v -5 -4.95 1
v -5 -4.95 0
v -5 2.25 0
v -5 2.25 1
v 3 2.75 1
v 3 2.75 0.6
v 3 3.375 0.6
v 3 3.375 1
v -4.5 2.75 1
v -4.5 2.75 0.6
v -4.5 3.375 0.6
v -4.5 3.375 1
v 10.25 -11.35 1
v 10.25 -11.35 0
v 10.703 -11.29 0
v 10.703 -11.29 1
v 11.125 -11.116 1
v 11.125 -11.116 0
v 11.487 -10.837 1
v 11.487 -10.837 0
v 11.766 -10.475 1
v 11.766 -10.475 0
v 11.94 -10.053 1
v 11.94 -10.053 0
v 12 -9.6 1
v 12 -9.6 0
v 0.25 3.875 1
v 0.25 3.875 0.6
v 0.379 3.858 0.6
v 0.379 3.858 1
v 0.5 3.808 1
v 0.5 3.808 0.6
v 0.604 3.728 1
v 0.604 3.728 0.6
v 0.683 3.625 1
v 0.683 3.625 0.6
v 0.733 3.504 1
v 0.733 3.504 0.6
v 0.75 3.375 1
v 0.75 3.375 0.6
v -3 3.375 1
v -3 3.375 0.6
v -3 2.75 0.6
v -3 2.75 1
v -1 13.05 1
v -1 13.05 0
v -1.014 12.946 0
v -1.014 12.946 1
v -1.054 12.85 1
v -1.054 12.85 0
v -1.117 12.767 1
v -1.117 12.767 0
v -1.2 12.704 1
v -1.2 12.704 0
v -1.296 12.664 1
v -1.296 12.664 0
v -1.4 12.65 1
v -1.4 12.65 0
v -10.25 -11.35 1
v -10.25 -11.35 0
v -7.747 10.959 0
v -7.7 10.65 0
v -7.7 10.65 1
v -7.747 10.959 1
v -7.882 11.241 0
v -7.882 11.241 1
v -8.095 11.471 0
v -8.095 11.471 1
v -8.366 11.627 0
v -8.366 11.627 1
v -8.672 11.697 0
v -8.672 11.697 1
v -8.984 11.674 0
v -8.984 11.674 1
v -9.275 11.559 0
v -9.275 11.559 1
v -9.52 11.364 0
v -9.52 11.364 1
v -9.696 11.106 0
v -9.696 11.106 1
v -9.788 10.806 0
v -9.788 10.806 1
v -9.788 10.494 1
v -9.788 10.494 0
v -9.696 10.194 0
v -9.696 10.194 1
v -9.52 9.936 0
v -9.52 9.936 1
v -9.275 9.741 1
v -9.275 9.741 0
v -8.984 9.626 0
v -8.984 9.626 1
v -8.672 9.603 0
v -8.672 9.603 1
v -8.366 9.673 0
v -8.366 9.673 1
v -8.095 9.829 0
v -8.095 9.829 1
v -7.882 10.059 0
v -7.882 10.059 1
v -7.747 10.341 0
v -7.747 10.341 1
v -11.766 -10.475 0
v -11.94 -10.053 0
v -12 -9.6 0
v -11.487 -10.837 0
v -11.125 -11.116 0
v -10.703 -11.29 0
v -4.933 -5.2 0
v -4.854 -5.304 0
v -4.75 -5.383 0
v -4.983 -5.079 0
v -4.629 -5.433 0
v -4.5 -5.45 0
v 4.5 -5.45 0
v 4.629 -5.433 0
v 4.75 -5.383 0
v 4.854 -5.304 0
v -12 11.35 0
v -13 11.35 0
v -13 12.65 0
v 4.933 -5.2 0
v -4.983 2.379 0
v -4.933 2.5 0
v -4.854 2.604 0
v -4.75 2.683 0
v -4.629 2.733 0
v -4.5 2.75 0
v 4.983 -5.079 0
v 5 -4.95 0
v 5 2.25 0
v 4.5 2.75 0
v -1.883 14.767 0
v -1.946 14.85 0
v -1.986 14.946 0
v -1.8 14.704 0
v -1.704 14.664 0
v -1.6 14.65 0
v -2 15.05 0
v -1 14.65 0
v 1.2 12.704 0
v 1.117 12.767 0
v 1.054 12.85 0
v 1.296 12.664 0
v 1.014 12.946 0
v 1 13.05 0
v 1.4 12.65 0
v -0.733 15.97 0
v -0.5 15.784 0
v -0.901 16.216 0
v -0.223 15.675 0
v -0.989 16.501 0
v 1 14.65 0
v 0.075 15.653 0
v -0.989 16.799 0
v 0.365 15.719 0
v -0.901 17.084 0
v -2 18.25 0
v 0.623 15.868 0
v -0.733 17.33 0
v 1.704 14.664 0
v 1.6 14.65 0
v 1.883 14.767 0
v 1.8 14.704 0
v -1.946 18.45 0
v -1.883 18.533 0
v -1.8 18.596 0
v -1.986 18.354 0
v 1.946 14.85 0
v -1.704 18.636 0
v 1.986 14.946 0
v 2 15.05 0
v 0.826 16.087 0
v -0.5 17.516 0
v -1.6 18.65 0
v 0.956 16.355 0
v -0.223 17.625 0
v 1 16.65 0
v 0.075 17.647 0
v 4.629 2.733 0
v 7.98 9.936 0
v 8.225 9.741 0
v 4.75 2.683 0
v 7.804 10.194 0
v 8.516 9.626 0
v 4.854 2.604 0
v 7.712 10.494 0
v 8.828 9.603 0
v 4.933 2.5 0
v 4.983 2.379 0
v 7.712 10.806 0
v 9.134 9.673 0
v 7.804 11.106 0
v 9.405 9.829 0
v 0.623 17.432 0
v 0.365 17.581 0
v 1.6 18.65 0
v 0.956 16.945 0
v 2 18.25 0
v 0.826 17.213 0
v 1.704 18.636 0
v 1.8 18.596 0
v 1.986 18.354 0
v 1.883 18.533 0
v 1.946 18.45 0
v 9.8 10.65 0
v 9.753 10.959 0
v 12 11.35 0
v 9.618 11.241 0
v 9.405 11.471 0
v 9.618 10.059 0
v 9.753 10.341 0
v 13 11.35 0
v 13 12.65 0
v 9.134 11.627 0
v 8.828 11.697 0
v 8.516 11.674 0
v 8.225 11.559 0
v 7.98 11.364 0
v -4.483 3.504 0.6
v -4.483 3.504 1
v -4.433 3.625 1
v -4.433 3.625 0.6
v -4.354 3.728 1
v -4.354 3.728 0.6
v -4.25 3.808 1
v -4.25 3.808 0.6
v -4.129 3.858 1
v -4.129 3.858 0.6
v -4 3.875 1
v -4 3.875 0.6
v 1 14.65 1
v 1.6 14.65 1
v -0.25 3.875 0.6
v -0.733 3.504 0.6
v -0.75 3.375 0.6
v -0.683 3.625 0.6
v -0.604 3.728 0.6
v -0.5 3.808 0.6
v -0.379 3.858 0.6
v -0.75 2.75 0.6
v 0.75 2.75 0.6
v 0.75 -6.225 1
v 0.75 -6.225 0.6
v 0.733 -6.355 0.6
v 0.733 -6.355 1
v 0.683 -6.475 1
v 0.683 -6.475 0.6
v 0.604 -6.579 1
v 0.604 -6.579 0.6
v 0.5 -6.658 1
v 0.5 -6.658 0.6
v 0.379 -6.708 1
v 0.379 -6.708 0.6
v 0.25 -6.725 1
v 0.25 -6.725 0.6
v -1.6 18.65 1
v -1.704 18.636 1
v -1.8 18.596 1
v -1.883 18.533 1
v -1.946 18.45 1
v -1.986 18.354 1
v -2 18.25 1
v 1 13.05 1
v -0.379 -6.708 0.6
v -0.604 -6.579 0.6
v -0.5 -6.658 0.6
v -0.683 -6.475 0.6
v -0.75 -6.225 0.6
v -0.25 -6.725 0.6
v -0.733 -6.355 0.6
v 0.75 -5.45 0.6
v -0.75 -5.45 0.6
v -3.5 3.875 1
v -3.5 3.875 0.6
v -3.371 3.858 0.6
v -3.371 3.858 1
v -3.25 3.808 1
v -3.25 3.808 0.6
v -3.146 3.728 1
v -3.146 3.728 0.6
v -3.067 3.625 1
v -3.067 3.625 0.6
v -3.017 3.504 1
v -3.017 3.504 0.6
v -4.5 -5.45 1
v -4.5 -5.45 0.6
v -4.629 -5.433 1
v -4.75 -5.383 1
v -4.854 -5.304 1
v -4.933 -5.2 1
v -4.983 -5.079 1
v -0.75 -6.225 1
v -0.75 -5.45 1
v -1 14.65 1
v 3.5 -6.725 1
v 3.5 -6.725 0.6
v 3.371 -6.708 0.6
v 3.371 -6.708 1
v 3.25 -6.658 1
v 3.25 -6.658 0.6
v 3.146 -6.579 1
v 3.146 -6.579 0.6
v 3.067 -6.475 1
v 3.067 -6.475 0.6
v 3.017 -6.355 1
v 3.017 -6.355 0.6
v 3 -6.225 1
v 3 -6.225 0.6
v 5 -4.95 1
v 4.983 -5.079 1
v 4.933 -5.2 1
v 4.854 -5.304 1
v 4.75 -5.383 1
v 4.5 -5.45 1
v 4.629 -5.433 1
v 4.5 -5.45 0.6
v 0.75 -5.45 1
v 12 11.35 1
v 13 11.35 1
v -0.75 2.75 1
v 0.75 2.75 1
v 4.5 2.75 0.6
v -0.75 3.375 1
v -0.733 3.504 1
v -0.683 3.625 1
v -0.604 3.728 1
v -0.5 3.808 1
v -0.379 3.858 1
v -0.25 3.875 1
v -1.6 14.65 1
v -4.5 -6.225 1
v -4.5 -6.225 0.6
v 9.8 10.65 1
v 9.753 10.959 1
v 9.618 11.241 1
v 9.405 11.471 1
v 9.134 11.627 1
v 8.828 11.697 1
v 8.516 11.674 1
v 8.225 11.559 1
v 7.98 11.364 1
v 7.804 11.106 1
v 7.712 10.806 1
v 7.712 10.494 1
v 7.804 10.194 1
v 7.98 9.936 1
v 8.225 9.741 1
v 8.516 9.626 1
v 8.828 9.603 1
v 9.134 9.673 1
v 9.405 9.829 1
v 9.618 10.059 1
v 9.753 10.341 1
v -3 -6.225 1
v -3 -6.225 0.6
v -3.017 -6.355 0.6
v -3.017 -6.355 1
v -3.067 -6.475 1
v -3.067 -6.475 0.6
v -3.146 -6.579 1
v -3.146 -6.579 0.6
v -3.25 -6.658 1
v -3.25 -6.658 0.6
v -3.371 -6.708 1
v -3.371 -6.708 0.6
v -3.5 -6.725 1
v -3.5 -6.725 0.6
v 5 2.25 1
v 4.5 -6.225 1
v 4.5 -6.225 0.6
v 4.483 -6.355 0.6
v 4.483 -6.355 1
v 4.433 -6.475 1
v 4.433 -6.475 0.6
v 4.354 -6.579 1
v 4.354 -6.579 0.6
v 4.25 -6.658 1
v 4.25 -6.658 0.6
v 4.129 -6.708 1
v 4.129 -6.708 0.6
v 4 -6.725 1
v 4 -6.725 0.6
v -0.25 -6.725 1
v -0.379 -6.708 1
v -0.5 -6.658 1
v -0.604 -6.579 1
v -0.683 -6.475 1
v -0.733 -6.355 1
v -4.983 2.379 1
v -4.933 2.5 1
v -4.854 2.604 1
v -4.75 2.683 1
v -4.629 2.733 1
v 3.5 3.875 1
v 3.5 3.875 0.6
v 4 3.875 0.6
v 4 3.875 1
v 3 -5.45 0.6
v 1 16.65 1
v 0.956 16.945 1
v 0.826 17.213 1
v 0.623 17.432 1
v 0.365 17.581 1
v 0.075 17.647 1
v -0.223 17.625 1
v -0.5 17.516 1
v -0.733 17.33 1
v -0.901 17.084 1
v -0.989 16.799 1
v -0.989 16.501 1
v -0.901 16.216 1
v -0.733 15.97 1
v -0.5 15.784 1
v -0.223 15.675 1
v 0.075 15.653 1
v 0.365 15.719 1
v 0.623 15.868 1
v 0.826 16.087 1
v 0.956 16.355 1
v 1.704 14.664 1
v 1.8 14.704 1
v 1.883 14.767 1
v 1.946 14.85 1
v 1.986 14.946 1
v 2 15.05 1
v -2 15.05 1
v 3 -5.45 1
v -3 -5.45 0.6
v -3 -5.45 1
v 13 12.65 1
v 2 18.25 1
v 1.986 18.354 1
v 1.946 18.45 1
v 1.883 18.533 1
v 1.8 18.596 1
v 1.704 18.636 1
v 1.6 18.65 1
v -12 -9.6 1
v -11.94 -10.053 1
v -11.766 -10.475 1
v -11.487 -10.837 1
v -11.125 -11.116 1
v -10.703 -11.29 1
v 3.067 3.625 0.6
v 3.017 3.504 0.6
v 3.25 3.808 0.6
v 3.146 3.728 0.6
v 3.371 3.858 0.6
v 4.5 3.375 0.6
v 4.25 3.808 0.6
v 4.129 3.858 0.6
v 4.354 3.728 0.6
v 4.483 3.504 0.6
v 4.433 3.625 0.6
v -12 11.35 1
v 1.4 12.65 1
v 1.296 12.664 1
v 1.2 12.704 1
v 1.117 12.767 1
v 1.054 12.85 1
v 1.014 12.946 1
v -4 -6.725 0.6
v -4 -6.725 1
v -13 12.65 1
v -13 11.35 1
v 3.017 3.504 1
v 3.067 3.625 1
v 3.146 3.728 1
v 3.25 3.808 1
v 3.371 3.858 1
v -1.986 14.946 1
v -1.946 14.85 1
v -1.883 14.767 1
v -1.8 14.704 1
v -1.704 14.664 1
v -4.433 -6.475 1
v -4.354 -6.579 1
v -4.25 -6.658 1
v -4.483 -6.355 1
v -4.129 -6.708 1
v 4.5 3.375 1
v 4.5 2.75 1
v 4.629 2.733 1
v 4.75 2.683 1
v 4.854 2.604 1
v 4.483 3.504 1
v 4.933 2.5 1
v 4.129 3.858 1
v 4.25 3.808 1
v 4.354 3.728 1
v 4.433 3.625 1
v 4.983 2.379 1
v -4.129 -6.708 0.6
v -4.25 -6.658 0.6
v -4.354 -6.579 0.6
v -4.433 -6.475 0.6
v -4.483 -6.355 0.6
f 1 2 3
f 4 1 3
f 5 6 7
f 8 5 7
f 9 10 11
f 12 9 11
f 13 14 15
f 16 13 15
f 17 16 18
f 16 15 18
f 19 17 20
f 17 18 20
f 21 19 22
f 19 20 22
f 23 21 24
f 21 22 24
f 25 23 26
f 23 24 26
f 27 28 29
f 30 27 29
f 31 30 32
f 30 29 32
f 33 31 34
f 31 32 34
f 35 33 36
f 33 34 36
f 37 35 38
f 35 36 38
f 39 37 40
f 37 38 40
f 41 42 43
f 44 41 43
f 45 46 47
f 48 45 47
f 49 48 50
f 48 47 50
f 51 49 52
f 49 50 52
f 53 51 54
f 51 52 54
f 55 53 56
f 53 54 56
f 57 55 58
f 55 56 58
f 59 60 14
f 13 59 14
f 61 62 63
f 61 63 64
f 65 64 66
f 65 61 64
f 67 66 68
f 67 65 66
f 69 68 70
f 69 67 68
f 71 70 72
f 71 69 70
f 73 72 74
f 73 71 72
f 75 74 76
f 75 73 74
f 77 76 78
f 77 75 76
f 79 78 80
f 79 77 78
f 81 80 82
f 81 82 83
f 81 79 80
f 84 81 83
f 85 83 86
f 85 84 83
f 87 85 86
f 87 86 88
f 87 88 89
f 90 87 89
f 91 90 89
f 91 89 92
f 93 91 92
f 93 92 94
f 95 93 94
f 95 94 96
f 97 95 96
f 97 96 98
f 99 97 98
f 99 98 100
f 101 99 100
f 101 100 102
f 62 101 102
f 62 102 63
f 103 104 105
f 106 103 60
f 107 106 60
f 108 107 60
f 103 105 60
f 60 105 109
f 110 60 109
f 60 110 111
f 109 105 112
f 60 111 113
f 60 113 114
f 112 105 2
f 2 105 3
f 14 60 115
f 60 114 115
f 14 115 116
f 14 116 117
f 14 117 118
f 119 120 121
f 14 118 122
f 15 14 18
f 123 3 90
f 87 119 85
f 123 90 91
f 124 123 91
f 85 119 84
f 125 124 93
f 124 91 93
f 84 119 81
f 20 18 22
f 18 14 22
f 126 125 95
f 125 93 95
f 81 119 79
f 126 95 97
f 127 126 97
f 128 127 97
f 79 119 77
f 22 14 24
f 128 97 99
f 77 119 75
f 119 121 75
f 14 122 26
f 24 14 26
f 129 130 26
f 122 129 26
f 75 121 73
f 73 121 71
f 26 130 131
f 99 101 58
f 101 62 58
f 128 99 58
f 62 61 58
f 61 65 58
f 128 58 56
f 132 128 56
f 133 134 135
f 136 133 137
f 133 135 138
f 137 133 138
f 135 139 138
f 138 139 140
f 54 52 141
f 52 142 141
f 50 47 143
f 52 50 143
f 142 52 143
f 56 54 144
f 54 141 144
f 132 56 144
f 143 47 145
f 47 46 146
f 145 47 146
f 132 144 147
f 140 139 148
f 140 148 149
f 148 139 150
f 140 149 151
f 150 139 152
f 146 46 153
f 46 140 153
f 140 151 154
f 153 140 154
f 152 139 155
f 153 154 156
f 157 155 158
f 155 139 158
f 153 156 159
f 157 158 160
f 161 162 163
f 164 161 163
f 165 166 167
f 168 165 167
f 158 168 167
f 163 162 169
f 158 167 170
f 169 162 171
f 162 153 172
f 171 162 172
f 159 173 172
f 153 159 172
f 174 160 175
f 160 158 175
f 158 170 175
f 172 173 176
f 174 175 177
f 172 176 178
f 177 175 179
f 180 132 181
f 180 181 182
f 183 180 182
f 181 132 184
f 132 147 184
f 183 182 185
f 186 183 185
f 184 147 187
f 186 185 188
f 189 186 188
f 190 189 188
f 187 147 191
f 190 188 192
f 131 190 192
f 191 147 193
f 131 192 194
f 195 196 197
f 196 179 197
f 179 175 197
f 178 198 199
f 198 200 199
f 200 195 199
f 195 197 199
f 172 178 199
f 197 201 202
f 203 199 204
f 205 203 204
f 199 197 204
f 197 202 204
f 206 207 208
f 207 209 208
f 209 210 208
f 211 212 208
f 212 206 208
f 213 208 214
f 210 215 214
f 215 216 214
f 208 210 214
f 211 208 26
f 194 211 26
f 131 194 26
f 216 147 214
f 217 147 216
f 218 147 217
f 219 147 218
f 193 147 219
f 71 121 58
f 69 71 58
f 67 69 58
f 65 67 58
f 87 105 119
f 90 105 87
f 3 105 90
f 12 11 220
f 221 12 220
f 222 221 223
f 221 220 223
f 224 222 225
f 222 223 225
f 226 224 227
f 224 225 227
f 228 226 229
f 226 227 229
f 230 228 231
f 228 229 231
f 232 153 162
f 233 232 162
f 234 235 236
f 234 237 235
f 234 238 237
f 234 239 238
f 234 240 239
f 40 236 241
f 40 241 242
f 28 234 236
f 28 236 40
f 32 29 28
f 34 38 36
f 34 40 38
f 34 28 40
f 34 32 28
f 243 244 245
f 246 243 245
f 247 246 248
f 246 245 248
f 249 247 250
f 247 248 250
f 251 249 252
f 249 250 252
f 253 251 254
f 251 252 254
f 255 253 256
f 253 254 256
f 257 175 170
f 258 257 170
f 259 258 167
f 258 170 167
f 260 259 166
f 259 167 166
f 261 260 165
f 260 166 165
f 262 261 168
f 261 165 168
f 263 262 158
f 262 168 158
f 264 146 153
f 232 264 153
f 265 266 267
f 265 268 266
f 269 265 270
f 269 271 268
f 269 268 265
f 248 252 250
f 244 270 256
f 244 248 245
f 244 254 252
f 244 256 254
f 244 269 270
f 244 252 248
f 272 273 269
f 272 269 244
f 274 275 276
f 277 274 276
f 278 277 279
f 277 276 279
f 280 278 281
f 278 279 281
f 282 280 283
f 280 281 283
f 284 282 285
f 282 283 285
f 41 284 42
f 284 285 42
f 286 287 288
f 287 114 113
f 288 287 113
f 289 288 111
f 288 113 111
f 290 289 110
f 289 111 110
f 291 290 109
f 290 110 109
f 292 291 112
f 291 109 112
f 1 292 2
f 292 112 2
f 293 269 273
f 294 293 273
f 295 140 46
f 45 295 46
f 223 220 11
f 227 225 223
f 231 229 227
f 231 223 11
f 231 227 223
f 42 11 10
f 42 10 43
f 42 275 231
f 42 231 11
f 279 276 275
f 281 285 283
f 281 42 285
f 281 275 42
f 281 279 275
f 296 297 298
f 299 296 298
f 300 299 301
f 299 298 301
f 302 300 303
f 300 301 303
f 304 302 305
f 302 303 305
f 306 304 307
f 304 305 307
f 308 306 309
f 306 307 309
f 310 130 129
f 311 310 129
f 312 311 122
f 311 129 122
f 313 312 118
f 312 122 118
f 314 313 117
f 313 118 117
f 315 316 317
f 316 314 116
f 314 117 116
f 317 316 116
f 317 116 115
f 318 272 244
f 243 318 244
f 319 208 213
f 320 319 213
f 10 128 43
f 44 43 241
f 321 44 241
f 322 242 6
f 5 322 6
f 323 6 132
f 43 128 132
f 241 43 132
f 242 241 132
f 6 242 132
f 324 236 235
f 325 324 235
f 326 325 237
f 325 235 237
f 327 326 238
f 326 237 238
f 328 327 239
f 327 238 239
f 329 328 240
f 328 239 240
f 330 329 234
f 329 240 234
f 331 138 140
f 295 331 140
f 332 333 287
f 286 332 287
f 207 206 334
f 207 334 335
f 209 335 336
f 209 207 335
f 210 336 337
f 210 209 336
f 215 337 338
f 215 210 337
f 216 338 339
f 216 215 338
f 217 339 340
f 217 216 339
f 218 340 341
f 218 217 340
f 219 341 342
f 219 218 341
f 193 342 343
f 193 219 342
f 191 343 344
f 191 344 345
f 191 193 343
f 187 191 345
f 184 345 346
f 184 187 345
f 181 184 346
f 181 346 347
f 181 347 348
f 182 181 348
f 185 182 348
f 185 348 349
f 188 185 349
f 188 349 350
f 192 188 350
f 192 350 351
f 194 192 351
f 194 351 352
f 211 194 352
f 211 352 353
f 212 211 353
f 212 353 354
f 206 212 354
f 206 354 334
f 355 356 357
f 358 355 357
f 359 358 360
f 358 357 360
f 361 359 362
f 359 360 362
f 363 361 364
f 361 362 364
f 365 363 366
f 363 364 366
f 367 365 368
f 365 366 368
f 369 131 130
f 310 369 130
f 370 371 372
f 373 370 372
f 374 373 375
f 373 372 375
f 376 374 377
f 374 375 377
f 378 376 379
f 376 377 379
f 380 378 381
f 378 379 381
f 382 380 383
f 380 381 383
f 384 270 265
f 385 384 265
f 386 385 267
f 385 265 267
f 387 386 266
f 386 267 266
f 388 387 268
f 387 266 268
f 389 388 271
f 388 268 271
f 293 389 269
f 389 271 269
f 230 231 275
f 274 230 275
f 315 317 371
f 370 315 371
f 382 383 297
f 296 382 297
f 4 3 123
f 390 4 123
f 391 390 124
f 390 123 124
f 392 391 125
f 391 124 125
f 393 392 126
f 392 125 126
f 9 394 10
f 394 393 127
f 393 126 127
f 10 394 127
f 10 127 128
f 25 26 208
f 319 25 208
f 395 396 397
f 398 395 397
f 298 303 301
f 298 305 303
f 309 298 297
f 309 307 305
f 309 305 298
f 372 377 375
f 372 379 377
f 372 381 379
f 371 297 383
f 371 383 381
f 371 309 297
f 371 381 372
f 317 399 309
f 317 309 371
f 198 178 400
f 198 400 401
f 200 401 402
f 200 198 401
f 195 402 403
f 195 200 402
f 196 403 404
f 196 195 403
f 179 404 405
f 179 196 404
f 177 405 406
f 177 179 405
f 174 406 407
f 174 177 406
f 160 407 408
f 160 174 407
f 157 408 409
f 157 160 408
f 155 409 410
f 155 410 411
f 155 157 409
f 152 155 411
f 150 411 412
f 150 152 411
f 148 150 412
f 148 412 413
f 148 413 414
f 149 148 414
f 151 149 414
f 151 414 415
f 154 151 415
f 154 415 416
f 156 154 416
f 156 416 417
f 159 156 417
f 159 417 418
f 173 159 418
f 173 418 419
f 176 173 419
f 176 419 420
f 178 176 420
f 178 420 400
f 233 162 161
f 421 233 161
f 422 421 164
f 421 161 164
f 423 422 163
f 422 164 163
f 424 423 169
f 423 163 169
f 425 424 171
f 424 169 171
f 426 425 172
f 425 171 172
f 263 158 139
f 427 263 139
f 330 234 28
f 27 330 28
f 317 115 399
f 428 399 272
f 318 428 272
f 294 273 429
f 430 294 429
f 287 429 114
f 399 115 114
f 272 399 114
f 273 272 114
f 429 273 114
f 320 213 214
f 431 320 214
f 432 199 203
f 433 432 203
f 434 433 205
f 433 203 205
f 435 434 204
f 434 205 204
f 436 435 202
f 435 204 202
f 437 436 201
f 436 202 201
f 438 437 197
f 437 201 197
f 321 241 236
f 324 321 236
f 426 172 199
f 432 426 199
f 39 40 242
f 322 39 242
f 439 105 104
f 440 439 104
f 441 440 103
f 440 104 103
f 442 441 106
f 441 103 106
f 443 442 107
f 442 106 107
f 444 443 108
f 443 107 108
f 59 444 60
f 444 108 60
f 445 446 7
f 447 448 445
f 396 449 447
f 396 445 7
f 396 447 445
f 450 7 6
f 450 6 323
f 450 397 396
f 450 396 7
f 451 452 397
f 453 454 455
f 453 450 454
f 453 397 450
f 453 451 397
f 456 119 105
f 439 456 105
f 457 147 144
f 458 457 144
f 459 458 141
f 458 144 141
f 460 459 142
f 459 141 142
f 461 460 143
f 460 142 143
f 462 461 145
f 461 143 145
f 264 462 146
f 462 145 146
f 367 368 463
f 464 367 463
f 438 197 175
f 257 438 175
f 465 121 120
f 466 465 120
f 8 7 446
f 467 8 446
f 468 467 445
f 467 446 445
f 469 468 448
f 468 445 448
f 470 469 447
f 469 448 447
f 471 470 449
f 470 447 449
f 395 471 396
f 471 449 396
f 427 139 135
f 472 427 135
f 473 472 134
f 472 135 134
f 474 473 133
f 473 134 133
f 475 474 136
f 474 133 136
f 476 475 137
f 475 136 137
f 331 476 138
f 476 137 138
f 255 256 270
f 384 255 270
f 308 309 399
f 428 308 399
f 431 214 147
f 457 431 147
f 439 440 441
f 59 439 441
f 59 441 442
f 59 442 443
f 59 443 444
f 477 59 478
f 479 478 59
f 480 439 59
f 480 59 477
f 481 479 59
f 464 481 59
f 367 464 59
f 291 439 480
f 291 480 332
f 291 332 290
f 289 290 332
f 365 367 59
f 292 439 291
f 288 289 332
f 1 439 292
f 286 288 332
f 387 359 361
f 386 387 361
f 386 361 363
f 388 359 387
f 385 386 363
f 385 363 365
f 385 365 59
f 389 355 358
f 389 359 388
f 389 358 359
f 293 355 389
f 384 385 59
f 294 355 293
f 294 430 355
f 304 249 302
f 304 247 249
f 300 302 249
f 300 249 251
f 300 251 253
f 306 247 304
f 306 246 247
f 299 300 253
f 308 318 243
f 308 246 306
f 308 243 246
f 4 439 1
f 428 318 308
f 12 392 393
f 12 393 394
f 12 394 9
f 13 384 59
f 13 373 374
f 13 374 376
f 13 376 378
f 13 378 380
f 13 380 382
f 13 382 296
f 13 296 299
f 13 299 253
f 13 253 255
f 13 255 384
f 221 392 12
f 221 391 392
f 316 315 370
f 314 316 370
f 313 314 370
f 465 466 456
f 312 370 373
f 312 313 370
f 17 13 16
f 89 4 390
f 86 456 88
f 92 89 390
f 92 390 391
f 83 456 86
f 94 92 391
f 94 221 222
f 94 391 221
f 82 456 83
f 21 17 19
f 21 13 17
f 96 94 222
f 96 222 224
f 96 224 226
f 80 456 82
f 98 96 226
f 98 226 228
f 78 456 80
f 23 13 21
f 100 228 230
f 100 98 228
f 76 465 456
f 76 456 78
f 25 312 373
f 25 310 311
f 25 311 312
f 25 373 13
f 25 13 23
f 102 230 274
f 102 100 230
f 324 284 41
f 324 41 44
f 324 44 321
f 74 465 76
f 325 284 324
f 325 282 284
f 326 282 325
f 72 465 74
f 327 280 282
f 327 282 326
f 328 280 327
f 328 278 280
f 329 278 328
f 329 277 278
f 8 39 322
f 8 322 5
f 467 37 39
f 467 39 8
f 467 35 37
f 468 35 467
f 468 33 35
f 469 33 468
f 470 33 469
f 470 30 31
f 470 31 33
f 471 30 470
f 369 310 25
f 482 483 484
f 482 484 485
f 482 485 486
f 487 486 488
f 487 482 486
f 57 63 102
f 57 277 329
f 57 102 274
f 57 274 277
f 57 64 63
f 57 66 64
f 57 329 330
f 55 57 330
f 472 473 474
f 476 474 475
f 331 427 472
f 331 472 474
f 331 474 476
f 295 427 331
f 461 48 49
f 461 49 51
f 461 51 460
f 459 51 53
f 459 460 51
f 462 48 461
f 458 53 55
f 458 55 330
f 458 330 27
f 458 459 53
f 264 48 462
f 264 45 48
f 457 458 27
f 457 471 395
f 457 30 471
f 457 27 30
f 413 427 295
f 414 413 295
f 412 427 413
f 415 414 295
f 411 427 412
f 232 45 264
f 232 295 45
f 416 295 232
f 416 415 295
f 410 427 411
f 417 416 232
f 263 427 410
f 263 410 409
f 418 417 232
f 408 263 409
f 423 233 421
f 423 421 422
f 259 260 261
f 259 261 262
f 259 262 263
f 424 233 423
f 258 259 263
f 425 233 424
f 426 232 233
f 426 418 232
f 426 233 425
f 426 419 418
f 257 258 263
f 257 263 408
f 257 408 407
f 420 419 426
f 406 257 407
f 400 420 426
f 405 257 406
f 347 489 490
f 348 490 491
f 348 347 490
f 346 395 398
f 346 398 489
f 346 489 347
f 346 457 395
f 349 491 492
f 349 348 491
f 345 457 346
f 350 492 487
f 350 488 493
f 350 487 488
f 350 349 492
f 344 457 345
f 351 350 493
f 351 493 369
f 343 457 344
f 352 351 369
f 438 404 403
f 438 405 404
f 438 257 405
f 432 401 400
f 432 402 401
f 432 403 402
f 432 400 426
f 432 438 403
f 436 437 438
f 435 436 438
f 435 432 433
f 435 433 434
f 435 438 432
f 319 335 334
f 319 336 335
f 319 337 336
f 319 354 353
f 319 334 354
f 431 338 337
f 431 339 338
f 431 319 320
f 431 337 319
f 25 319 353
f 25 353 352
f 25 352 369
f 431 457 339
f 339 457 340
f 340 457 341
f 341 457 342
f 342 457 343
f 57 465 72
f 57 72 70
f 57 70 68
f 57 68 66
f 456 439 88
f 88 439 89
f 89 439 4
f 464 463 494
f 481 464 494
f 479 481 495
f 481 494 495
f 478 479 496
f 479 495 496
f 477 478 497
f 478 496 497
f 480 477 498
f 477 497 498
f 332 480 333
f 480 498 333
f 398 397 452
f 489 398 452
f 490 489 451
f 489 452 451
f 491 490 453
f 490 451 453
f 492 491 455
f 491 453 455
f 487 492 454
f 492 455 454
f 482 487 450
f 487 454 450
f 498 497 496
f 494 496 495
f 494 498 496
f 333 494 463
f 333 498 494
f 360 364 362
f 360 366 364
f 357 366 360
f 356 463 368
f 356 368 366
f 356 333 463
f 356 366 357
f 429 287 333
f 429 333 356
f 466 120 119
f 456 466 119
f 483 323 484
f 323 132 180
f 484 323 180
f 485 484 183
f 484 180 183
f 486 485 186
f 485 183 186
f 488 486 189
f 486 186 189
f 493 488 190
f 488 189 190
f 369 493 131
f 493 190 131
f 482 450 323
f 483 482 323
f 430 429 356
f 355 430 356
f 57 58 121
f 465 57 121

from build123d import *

# Parameters (mm, degrees)
F0_R     = 1.05
F0_R_2   = 1
F1_DEPTH = 0.6
F2_DEPTH = 1


with BuildPart() as f1:
    # F0 (on Top) → F1 (new body)
    with BuildSketch(Plane.XY):
        with BuildLine():
            Line((-10.25, -11.35), (10.25, -11.35))
            ThreePointArc((10.25, -11.35), (11.487437, -10.837437), (12, -9.6))
            Line((12, -9.6), (12, 11.35))
            Line((12, 11.35), (13, 11.35))
            Line((13, 11.35), (13, 12.65))
            Line((13, 12.65), (1.4, 12.65))
            ThreePointArc((1.4, 12.65), (1.117157, 12.767157), (1, 13.05))
            Line((1, 13.05), (1, 14.65))
            Line((1, 14.65), (1.6, 14.65))
            ThreePointArc((1.6, 14.65), (1.882843, 14.767157), (2, 15.05))
            Line((2, 15.05), (2, 18.25))
            ThreePointArc((2, 18.25), (1.882843, 18.532843), (1.6, 18.65))
            Line((1.6, 18.65), (-1.6, 18.65))
            ThreePointArc((-1.6, 18.65), (-1.882843, 18.532843), (-2, 18.25))
            Line((-2, 18.25), (-2, 15.05))
            ThreePointArc((-2, 15.05), (-1.882843, 14.767157), (-1.6, 14.65))
            Line((-1.6, 14.65), (-1, 14.65))
            Line((-1, 14.65), (-1, 13.05))
            ThreePointArc((-1, 13.05), (-1.117157, 12.767157), (-1.4, 12.65))
            Line((-1.4, 12.65), (-13, 12.65))
            Line((-13, 12.65), (-13, 11.35))
            Line((-13, 11.35), (-12, 11.35))
            Line((-12, 11.35), (-12, -9.6))
            ThreePointArc((-12, -9.6), (-11.487437, -10.837437), (-10.25, -11.35))
        make_face()
        with BuildLine():
            ThreePointArc((-5, 2.25), (-4.853553, 2.603553), (-4.5, 2.75))
            Line((-4.5, 2.75), (-4.5, 3.374709))
            ThreePointArc((-4.5, 3.374709), (-4.353553, 3.728262), (-4, 3.874709))
            Line((-4, 3.874709), (-3.5, 3.874709))
            ThreePointArc((-3.5, 3.874709), (-3.146447, 3.728262), (-3, 3.374709))
            Line((-3, 3.374709), (-3, 2.75))
            Line((-3, 2.75), (-0.75, 2.75))
            Line((-0.75, 2.75), (-0.75, 3.374709))
            ThreePointArc((-0.75, 3.374709), (-0.603553, 3.728262), (-0.25, 3.874709))
            Line((-0.25, 3.874709), (0.25, 3.874709))
            ThreePointArc((0.25, 3.874709), (0.603553, 3.728262), (0.75, 3.374709))
            Line((0.75, 3.374709), (0.75, 2.75))
            Line((0.75, 2.75), (3, 2.75))
            Line((3, 2.75), (3, 3.374709))
            ThreePointArc((3, 3.374709), (3.146447, 3.728262), (3.5, 3.874709))
            Line((3.5, 3.874709), (4, 3.874709))
            ThreePointArc((4, 3.874709), (4.353553, 3.728262), (4.5, 3.374709))
            Line((4.5, 3.374709), (4.5, 2.75))
            ThreePointArc((4.5, 2.75), (4.853553, 2.603553), (5, 2.25))
            Line((5, 2.25), (5, -4.95))
            ThreePointArc((5, -4.95), (4.853553, -5.303553), (4.5, -5.45))
            Line((4.5, -5.45), (4.5, -6.225291))
            ThreePointArc((4.5, -6.225291), (4.353553, -6.578845), (4, -6.725291))
            Line((4, -6.725291), (3.5, -6.725291))
            ThreePointArc((3.5, -6.725291), (3.146447, -6.578845), (3, -6.225291))
            Line((3, -6.225291), (3, -5.45))
            Line((3, -5.45), (0.75, -5.45))
            Line((0.75, -5.45), (0.75, -6.225291))
            ThreePointArc((0.75, -6.225291), (0.603553, -6.578845), (0.25, -6.725291))
            Line((0.25, -6.725291), (-0.25, -6.725291))
            ThreePointArc((-0.25, -6.725291), (-0.603553, -6.578845), (-0.75, -6.225291))
            Line((-0.75, -6.225291), (-0.75, -5.45))
            Line((-0.75, -5.45), (-3, -5.45))
            Line((-3, -5.45), (-3, -6.225291))
            ThreePointArc((-3, -6.225291), (-3.146447, -6.578845), (-3.5, -6.725291))
            Line((-3.5, -6.725291), (-4, -6.725291))
            ThreePointArc((-4, -6.725291), (-4.353553, -6.578845), (-4.5, -6.225291))
            Line((-4.5, -6.225291), (-4.5, -5.45))
            ThreePointArc((-4.5, -5.45), (-4.853553, -5.303553), (-5, -4.95))
            Line((-5, -4.95), (-5, 2.25))
        make_face(mode=Mode.SUBTRACT)
        with Locations((-8.75, 10.65)):
            Circle(F0_R, mode=Mode.SUBTRACT)
        with Locations((8.75, 10.65)):
            Circle(F0_R, mode=Mode.SUBTRACT)
        with Locations((0, 16.65)):
            Circle(F0_R_2, mode=Mode.SUBTRACT)
        with BuildLine():
            Line((-4.5, 3.374709), (-4.5, 2.75))
            Line((-4.5, 2.75), (-3, 2.75))
            Line((-3, 2.75), (-3, 3.374709))
            ThreePointArc((-3, 3.374709), (-3.146447, 3.728262), (-3.5, 3.874709))
            Line((-3.5, 3.874709), (-4, 3.874709))
            ThreePointArc((-4, 3.874709), (-4.353553, 3.728262), (-4.5, 3.374709))
        make_face()
        with BuildLine():
            Line((-0.75, 3.374709), (-0.75, 2.75))
            Line((-0.75, 2.75), (0.75, 2.75))
            Line((0.75, 2.75), (0.75, 3.374709))
            ThreePointArc((0.75, 3.374709), (0.603553, 3.728262), (0.25, 3.874709))
            Line((0.25, 3.874709), (-0.25, 3.874709))
            ThreePointArc((-0.25, 3.874709), (-0.603553, 3.728262), (-0.75, 3.374709))
        make_face()
        with BuildLine():
            Line((3, 3.374709), (3, 2.75))
            Line((3, 2.75), (4.5, 2.75))
            Line((4.5, 2.75), (4.5, 3.374709))
            ThreePointArc((4.5, 3.374709), (4.353553, 3.728262), (4, 3.874709))
            Line((4, 3.874709), (3.5, 3.874709))
            ThreePointArc((3.5, 3.874709), (3.146447, 3.728262), (3, 3.374709))
        make_face()
        with BuildLine():
            Line((4.5, -5.45), (3, -5.45))
            Line((3, -5.45), (3, -6.225291))
            ThreePointArc((3, -6.225291), (3.146447, -6.578845), (3.5, -6.725291))
            Line((3.5, -6.725291), (4, -6.725291))
            ThreePointArc((4, -6.725291), (4.353553, -6.578845), (4.5, -6.225291))
            Line((4.5, -6.225291), (4.5, -5.45))
        make_face()
        with BuildLine():
            Line((0.75, -5.45), (-0.75, -5.45))
            Line((-0.75, -5.45), (-0.75, -6.225291))
            ThreePointArc((-0.75, -6.225291), (-0.603553, -6.578845), (-0.25, -6.725291))
            Line((-0.25, -6.725291), (0.25, -6.725291))
            ThreePointArc((0.25, -6.725291), (0.603553, -6.578845), (0.75, -6.225291))
            Line((0.75, -6.225291), (0.75, -5.45))
        make_face()
        with BuildLine():
            Line((-3, -5.45), (-4.5, -5.45))
            Line((-4.5, -5.45), (-4.5, -6.225291))
            ThreePointArc((-4.5, -6.225291), (-4.353553, -6.578845), (-4, -6.725291))
            Line((-4, -6.725291), (-3.5, -6.725291))
            ThreePointArc((-3.5, -6.725291), (-3.146447, -6.578845), (-3, -6.225291))
            Line((-3, -6.225291), (-3, -5.45))
        make_face()
    extrude(amount=F1_DEPTH)

    # F0 (on Top) → F2 (join)
    with BuildSketch(Plane.XY):
        with BuildLine():
            Line((-10.25, -11.35), (10.25, -11.35))
            ThreePointArc((10.25, -11.35), (11.487437, -10.837437), (12, -9.6))
            Line((12, -9.6), (12, 11.35))
            Line((12, 11.35), (13, 11.35))
            Line((13, 11.35), (13, 12.65))
            Line((13, 12.65), (1.4, 12.65))
            ThreePointArc((1.4, 12.65), (1.117157, 12.767157), (1, 13.05))
            Line((1, 13.05), (1, 14.65))
            Line((1, 14.65), (1.6, 14.65))
            ThreePointArc((1.6, 14.65), (1.882843, 14.767157), (2, 15.05))
            Line((2, 15.05), (2, 18.25))
            ThreePointArc((2, 18.25), (1.882843, 18.532843), (1.6, 18.65))
            Line((1.6, 18.65), (-1.6, 18.65))
            ThreePointArc((-1.6, 18.65), (-1.882843, 18.532843), (-2, 18.25))
            Line((-2, 18.25), (-2, 15.05))
            ThreePointArc((-2, 15.05), (-1.882843, 14.767157), (-1.6, 14.65))
            Line((-1.6, 14.65), (-1, 14.65))
            Line((-1, 14.65), (-1, 13.05))
            ThreePointArc((-1, 13.05), (-1.117157, 12.767157), (-1.4, 12.65))
            Line((-1.4, 12.65), (-13, 12.65))
            Line((-13, 12.65), (-13, 11.35))
            Line((-13, 11.35), (-12, 11.35))
            Line((-12, 11.35), (-12, -9.6))
            ThreePointArc((-12, -9.6), (-11.487437, -10.837437), (-10.25, -11.35))
        make_face()
        with BuildLine():
            ThreePointArc((-5, 2.25), (-4.853553, 2.603553), (-4.5, 2.75))
            Line((-4.5, 2.75), (-4.5, 3.374709))
            ThreePointArc((-4.5, 3.374709), (-4.353553, 3.728262), (-4, 3.874709))
            Line((-4, 3.874709), (-3.5, 3.874709))
            ThreePointArc((-3.5, 3.874709), (-3.146447, 3.728262), (-3, 3.374709))
            Line((-3, 3.374709), (-3, 2.75))
            Line((-3, 2.75), (-0.75, 2.75))
            Line((-0.75, 2.75), (-0.75, 3.374709))
            ThreePointArc((-0.75, 3.374709), (-0.603553, 3.728262), (-0.25, 3.874709))
            Line((-0.25, 3.874709), (0.25, 3.874709))
            ThreePointArc((0.25, 3.874709), (0.603553, 3.728262), (0.75, 3.374709))
            Line((0.75, 3.374709), (0.75, 2.75))
            Line((0.75, 2.75), (3, 2.75))
            Line((3, 2.75), (3, 3.374709))
            ThreePointArc((3, 3.374709), (3.146447, 3.728262), (3.5, 3.874709))
            Line((3.5, 3.874709), (4, 3.874709))
            ThreePointArc((4, 3.874709), (4.353553, 3.728262), (4.5, 3.374709))
            Line((4.5, 3.374709), (4.5, 2.75))
            ThreePointArc((4.5, 2.75), (4.853553, 2.603553), (5, 2.25))
            Line((5, 2.25), (5, -4.95))
            ThreePointArc((5, -4.95), (4.853553, -5.303553), (4.5, -5.45))
            Line((4.5, -5.45), (4.5, -6.225291))
            ThreePointArc((4.5, -6.225291), (4.353553, -6.578845), (4, -6.725291))
            Line((4, -6.725291), (3.5, -6.725291))
            ThreePointArc((3.5, -6.725291), (3.146447, -6.578845), (3, -6.225291))
            Line((3, -6.225291), (3, -5.45))
            Line((3, -5.45), (0.75, -5.45))
            Line((0.75, -5.45), (0.75, -6.225291))
            ThreePointArc((0.75, -6.225291), (0.603553, -6.578845), (0.25, -6.725291))
            Line((0.25, -6.725291), (-0.25, -6.725291))
            ThreePointArc((-0.25, -6.725291), (-0.603553, -6.578845), (-0.75, -6.225291))
            Line((-0.75, -6.225291), (-0.75, -5.45))
            Line((-0.75, -5.45), (-3, -5.45))
            Line((-3, -5.45), (-3, -6.225291))
            ThreePointArc((-3, -6.225291), (-3.146447, -6.578845), (-3.5, -6.725291))
            Line((-3.5, -6.725291), (-4, -6.725291))
            ThreePointArc((-4, -6.725291), (-4.353553, -6.578845), (-4.5, -6.225291))
            Line((-4.5, -6.225291), (-4.5, -5.45))
            ThreePointArc((-4.5, -5.45), (-4.853553, -5.303553), (-5, -4.95))
            Line((-5, -4.95), (-5, 2.25))
        make_face(mode=Mode.SUBTRACT)
        with Locations((-8.75, 10.65)):
            Circle(F0_R, mode=Mode.SUBTRACT)
        with Locations((8.75, 10.65)):
            Circle(F0_R, mode=Mode.SUBTRACT)
        with Locations((0, 16.65)):
            Circle(F0_R_2, mode=Mode.SUBTRACT)
    extrude(amount=F2_DEPTH)


solid = f1.part
